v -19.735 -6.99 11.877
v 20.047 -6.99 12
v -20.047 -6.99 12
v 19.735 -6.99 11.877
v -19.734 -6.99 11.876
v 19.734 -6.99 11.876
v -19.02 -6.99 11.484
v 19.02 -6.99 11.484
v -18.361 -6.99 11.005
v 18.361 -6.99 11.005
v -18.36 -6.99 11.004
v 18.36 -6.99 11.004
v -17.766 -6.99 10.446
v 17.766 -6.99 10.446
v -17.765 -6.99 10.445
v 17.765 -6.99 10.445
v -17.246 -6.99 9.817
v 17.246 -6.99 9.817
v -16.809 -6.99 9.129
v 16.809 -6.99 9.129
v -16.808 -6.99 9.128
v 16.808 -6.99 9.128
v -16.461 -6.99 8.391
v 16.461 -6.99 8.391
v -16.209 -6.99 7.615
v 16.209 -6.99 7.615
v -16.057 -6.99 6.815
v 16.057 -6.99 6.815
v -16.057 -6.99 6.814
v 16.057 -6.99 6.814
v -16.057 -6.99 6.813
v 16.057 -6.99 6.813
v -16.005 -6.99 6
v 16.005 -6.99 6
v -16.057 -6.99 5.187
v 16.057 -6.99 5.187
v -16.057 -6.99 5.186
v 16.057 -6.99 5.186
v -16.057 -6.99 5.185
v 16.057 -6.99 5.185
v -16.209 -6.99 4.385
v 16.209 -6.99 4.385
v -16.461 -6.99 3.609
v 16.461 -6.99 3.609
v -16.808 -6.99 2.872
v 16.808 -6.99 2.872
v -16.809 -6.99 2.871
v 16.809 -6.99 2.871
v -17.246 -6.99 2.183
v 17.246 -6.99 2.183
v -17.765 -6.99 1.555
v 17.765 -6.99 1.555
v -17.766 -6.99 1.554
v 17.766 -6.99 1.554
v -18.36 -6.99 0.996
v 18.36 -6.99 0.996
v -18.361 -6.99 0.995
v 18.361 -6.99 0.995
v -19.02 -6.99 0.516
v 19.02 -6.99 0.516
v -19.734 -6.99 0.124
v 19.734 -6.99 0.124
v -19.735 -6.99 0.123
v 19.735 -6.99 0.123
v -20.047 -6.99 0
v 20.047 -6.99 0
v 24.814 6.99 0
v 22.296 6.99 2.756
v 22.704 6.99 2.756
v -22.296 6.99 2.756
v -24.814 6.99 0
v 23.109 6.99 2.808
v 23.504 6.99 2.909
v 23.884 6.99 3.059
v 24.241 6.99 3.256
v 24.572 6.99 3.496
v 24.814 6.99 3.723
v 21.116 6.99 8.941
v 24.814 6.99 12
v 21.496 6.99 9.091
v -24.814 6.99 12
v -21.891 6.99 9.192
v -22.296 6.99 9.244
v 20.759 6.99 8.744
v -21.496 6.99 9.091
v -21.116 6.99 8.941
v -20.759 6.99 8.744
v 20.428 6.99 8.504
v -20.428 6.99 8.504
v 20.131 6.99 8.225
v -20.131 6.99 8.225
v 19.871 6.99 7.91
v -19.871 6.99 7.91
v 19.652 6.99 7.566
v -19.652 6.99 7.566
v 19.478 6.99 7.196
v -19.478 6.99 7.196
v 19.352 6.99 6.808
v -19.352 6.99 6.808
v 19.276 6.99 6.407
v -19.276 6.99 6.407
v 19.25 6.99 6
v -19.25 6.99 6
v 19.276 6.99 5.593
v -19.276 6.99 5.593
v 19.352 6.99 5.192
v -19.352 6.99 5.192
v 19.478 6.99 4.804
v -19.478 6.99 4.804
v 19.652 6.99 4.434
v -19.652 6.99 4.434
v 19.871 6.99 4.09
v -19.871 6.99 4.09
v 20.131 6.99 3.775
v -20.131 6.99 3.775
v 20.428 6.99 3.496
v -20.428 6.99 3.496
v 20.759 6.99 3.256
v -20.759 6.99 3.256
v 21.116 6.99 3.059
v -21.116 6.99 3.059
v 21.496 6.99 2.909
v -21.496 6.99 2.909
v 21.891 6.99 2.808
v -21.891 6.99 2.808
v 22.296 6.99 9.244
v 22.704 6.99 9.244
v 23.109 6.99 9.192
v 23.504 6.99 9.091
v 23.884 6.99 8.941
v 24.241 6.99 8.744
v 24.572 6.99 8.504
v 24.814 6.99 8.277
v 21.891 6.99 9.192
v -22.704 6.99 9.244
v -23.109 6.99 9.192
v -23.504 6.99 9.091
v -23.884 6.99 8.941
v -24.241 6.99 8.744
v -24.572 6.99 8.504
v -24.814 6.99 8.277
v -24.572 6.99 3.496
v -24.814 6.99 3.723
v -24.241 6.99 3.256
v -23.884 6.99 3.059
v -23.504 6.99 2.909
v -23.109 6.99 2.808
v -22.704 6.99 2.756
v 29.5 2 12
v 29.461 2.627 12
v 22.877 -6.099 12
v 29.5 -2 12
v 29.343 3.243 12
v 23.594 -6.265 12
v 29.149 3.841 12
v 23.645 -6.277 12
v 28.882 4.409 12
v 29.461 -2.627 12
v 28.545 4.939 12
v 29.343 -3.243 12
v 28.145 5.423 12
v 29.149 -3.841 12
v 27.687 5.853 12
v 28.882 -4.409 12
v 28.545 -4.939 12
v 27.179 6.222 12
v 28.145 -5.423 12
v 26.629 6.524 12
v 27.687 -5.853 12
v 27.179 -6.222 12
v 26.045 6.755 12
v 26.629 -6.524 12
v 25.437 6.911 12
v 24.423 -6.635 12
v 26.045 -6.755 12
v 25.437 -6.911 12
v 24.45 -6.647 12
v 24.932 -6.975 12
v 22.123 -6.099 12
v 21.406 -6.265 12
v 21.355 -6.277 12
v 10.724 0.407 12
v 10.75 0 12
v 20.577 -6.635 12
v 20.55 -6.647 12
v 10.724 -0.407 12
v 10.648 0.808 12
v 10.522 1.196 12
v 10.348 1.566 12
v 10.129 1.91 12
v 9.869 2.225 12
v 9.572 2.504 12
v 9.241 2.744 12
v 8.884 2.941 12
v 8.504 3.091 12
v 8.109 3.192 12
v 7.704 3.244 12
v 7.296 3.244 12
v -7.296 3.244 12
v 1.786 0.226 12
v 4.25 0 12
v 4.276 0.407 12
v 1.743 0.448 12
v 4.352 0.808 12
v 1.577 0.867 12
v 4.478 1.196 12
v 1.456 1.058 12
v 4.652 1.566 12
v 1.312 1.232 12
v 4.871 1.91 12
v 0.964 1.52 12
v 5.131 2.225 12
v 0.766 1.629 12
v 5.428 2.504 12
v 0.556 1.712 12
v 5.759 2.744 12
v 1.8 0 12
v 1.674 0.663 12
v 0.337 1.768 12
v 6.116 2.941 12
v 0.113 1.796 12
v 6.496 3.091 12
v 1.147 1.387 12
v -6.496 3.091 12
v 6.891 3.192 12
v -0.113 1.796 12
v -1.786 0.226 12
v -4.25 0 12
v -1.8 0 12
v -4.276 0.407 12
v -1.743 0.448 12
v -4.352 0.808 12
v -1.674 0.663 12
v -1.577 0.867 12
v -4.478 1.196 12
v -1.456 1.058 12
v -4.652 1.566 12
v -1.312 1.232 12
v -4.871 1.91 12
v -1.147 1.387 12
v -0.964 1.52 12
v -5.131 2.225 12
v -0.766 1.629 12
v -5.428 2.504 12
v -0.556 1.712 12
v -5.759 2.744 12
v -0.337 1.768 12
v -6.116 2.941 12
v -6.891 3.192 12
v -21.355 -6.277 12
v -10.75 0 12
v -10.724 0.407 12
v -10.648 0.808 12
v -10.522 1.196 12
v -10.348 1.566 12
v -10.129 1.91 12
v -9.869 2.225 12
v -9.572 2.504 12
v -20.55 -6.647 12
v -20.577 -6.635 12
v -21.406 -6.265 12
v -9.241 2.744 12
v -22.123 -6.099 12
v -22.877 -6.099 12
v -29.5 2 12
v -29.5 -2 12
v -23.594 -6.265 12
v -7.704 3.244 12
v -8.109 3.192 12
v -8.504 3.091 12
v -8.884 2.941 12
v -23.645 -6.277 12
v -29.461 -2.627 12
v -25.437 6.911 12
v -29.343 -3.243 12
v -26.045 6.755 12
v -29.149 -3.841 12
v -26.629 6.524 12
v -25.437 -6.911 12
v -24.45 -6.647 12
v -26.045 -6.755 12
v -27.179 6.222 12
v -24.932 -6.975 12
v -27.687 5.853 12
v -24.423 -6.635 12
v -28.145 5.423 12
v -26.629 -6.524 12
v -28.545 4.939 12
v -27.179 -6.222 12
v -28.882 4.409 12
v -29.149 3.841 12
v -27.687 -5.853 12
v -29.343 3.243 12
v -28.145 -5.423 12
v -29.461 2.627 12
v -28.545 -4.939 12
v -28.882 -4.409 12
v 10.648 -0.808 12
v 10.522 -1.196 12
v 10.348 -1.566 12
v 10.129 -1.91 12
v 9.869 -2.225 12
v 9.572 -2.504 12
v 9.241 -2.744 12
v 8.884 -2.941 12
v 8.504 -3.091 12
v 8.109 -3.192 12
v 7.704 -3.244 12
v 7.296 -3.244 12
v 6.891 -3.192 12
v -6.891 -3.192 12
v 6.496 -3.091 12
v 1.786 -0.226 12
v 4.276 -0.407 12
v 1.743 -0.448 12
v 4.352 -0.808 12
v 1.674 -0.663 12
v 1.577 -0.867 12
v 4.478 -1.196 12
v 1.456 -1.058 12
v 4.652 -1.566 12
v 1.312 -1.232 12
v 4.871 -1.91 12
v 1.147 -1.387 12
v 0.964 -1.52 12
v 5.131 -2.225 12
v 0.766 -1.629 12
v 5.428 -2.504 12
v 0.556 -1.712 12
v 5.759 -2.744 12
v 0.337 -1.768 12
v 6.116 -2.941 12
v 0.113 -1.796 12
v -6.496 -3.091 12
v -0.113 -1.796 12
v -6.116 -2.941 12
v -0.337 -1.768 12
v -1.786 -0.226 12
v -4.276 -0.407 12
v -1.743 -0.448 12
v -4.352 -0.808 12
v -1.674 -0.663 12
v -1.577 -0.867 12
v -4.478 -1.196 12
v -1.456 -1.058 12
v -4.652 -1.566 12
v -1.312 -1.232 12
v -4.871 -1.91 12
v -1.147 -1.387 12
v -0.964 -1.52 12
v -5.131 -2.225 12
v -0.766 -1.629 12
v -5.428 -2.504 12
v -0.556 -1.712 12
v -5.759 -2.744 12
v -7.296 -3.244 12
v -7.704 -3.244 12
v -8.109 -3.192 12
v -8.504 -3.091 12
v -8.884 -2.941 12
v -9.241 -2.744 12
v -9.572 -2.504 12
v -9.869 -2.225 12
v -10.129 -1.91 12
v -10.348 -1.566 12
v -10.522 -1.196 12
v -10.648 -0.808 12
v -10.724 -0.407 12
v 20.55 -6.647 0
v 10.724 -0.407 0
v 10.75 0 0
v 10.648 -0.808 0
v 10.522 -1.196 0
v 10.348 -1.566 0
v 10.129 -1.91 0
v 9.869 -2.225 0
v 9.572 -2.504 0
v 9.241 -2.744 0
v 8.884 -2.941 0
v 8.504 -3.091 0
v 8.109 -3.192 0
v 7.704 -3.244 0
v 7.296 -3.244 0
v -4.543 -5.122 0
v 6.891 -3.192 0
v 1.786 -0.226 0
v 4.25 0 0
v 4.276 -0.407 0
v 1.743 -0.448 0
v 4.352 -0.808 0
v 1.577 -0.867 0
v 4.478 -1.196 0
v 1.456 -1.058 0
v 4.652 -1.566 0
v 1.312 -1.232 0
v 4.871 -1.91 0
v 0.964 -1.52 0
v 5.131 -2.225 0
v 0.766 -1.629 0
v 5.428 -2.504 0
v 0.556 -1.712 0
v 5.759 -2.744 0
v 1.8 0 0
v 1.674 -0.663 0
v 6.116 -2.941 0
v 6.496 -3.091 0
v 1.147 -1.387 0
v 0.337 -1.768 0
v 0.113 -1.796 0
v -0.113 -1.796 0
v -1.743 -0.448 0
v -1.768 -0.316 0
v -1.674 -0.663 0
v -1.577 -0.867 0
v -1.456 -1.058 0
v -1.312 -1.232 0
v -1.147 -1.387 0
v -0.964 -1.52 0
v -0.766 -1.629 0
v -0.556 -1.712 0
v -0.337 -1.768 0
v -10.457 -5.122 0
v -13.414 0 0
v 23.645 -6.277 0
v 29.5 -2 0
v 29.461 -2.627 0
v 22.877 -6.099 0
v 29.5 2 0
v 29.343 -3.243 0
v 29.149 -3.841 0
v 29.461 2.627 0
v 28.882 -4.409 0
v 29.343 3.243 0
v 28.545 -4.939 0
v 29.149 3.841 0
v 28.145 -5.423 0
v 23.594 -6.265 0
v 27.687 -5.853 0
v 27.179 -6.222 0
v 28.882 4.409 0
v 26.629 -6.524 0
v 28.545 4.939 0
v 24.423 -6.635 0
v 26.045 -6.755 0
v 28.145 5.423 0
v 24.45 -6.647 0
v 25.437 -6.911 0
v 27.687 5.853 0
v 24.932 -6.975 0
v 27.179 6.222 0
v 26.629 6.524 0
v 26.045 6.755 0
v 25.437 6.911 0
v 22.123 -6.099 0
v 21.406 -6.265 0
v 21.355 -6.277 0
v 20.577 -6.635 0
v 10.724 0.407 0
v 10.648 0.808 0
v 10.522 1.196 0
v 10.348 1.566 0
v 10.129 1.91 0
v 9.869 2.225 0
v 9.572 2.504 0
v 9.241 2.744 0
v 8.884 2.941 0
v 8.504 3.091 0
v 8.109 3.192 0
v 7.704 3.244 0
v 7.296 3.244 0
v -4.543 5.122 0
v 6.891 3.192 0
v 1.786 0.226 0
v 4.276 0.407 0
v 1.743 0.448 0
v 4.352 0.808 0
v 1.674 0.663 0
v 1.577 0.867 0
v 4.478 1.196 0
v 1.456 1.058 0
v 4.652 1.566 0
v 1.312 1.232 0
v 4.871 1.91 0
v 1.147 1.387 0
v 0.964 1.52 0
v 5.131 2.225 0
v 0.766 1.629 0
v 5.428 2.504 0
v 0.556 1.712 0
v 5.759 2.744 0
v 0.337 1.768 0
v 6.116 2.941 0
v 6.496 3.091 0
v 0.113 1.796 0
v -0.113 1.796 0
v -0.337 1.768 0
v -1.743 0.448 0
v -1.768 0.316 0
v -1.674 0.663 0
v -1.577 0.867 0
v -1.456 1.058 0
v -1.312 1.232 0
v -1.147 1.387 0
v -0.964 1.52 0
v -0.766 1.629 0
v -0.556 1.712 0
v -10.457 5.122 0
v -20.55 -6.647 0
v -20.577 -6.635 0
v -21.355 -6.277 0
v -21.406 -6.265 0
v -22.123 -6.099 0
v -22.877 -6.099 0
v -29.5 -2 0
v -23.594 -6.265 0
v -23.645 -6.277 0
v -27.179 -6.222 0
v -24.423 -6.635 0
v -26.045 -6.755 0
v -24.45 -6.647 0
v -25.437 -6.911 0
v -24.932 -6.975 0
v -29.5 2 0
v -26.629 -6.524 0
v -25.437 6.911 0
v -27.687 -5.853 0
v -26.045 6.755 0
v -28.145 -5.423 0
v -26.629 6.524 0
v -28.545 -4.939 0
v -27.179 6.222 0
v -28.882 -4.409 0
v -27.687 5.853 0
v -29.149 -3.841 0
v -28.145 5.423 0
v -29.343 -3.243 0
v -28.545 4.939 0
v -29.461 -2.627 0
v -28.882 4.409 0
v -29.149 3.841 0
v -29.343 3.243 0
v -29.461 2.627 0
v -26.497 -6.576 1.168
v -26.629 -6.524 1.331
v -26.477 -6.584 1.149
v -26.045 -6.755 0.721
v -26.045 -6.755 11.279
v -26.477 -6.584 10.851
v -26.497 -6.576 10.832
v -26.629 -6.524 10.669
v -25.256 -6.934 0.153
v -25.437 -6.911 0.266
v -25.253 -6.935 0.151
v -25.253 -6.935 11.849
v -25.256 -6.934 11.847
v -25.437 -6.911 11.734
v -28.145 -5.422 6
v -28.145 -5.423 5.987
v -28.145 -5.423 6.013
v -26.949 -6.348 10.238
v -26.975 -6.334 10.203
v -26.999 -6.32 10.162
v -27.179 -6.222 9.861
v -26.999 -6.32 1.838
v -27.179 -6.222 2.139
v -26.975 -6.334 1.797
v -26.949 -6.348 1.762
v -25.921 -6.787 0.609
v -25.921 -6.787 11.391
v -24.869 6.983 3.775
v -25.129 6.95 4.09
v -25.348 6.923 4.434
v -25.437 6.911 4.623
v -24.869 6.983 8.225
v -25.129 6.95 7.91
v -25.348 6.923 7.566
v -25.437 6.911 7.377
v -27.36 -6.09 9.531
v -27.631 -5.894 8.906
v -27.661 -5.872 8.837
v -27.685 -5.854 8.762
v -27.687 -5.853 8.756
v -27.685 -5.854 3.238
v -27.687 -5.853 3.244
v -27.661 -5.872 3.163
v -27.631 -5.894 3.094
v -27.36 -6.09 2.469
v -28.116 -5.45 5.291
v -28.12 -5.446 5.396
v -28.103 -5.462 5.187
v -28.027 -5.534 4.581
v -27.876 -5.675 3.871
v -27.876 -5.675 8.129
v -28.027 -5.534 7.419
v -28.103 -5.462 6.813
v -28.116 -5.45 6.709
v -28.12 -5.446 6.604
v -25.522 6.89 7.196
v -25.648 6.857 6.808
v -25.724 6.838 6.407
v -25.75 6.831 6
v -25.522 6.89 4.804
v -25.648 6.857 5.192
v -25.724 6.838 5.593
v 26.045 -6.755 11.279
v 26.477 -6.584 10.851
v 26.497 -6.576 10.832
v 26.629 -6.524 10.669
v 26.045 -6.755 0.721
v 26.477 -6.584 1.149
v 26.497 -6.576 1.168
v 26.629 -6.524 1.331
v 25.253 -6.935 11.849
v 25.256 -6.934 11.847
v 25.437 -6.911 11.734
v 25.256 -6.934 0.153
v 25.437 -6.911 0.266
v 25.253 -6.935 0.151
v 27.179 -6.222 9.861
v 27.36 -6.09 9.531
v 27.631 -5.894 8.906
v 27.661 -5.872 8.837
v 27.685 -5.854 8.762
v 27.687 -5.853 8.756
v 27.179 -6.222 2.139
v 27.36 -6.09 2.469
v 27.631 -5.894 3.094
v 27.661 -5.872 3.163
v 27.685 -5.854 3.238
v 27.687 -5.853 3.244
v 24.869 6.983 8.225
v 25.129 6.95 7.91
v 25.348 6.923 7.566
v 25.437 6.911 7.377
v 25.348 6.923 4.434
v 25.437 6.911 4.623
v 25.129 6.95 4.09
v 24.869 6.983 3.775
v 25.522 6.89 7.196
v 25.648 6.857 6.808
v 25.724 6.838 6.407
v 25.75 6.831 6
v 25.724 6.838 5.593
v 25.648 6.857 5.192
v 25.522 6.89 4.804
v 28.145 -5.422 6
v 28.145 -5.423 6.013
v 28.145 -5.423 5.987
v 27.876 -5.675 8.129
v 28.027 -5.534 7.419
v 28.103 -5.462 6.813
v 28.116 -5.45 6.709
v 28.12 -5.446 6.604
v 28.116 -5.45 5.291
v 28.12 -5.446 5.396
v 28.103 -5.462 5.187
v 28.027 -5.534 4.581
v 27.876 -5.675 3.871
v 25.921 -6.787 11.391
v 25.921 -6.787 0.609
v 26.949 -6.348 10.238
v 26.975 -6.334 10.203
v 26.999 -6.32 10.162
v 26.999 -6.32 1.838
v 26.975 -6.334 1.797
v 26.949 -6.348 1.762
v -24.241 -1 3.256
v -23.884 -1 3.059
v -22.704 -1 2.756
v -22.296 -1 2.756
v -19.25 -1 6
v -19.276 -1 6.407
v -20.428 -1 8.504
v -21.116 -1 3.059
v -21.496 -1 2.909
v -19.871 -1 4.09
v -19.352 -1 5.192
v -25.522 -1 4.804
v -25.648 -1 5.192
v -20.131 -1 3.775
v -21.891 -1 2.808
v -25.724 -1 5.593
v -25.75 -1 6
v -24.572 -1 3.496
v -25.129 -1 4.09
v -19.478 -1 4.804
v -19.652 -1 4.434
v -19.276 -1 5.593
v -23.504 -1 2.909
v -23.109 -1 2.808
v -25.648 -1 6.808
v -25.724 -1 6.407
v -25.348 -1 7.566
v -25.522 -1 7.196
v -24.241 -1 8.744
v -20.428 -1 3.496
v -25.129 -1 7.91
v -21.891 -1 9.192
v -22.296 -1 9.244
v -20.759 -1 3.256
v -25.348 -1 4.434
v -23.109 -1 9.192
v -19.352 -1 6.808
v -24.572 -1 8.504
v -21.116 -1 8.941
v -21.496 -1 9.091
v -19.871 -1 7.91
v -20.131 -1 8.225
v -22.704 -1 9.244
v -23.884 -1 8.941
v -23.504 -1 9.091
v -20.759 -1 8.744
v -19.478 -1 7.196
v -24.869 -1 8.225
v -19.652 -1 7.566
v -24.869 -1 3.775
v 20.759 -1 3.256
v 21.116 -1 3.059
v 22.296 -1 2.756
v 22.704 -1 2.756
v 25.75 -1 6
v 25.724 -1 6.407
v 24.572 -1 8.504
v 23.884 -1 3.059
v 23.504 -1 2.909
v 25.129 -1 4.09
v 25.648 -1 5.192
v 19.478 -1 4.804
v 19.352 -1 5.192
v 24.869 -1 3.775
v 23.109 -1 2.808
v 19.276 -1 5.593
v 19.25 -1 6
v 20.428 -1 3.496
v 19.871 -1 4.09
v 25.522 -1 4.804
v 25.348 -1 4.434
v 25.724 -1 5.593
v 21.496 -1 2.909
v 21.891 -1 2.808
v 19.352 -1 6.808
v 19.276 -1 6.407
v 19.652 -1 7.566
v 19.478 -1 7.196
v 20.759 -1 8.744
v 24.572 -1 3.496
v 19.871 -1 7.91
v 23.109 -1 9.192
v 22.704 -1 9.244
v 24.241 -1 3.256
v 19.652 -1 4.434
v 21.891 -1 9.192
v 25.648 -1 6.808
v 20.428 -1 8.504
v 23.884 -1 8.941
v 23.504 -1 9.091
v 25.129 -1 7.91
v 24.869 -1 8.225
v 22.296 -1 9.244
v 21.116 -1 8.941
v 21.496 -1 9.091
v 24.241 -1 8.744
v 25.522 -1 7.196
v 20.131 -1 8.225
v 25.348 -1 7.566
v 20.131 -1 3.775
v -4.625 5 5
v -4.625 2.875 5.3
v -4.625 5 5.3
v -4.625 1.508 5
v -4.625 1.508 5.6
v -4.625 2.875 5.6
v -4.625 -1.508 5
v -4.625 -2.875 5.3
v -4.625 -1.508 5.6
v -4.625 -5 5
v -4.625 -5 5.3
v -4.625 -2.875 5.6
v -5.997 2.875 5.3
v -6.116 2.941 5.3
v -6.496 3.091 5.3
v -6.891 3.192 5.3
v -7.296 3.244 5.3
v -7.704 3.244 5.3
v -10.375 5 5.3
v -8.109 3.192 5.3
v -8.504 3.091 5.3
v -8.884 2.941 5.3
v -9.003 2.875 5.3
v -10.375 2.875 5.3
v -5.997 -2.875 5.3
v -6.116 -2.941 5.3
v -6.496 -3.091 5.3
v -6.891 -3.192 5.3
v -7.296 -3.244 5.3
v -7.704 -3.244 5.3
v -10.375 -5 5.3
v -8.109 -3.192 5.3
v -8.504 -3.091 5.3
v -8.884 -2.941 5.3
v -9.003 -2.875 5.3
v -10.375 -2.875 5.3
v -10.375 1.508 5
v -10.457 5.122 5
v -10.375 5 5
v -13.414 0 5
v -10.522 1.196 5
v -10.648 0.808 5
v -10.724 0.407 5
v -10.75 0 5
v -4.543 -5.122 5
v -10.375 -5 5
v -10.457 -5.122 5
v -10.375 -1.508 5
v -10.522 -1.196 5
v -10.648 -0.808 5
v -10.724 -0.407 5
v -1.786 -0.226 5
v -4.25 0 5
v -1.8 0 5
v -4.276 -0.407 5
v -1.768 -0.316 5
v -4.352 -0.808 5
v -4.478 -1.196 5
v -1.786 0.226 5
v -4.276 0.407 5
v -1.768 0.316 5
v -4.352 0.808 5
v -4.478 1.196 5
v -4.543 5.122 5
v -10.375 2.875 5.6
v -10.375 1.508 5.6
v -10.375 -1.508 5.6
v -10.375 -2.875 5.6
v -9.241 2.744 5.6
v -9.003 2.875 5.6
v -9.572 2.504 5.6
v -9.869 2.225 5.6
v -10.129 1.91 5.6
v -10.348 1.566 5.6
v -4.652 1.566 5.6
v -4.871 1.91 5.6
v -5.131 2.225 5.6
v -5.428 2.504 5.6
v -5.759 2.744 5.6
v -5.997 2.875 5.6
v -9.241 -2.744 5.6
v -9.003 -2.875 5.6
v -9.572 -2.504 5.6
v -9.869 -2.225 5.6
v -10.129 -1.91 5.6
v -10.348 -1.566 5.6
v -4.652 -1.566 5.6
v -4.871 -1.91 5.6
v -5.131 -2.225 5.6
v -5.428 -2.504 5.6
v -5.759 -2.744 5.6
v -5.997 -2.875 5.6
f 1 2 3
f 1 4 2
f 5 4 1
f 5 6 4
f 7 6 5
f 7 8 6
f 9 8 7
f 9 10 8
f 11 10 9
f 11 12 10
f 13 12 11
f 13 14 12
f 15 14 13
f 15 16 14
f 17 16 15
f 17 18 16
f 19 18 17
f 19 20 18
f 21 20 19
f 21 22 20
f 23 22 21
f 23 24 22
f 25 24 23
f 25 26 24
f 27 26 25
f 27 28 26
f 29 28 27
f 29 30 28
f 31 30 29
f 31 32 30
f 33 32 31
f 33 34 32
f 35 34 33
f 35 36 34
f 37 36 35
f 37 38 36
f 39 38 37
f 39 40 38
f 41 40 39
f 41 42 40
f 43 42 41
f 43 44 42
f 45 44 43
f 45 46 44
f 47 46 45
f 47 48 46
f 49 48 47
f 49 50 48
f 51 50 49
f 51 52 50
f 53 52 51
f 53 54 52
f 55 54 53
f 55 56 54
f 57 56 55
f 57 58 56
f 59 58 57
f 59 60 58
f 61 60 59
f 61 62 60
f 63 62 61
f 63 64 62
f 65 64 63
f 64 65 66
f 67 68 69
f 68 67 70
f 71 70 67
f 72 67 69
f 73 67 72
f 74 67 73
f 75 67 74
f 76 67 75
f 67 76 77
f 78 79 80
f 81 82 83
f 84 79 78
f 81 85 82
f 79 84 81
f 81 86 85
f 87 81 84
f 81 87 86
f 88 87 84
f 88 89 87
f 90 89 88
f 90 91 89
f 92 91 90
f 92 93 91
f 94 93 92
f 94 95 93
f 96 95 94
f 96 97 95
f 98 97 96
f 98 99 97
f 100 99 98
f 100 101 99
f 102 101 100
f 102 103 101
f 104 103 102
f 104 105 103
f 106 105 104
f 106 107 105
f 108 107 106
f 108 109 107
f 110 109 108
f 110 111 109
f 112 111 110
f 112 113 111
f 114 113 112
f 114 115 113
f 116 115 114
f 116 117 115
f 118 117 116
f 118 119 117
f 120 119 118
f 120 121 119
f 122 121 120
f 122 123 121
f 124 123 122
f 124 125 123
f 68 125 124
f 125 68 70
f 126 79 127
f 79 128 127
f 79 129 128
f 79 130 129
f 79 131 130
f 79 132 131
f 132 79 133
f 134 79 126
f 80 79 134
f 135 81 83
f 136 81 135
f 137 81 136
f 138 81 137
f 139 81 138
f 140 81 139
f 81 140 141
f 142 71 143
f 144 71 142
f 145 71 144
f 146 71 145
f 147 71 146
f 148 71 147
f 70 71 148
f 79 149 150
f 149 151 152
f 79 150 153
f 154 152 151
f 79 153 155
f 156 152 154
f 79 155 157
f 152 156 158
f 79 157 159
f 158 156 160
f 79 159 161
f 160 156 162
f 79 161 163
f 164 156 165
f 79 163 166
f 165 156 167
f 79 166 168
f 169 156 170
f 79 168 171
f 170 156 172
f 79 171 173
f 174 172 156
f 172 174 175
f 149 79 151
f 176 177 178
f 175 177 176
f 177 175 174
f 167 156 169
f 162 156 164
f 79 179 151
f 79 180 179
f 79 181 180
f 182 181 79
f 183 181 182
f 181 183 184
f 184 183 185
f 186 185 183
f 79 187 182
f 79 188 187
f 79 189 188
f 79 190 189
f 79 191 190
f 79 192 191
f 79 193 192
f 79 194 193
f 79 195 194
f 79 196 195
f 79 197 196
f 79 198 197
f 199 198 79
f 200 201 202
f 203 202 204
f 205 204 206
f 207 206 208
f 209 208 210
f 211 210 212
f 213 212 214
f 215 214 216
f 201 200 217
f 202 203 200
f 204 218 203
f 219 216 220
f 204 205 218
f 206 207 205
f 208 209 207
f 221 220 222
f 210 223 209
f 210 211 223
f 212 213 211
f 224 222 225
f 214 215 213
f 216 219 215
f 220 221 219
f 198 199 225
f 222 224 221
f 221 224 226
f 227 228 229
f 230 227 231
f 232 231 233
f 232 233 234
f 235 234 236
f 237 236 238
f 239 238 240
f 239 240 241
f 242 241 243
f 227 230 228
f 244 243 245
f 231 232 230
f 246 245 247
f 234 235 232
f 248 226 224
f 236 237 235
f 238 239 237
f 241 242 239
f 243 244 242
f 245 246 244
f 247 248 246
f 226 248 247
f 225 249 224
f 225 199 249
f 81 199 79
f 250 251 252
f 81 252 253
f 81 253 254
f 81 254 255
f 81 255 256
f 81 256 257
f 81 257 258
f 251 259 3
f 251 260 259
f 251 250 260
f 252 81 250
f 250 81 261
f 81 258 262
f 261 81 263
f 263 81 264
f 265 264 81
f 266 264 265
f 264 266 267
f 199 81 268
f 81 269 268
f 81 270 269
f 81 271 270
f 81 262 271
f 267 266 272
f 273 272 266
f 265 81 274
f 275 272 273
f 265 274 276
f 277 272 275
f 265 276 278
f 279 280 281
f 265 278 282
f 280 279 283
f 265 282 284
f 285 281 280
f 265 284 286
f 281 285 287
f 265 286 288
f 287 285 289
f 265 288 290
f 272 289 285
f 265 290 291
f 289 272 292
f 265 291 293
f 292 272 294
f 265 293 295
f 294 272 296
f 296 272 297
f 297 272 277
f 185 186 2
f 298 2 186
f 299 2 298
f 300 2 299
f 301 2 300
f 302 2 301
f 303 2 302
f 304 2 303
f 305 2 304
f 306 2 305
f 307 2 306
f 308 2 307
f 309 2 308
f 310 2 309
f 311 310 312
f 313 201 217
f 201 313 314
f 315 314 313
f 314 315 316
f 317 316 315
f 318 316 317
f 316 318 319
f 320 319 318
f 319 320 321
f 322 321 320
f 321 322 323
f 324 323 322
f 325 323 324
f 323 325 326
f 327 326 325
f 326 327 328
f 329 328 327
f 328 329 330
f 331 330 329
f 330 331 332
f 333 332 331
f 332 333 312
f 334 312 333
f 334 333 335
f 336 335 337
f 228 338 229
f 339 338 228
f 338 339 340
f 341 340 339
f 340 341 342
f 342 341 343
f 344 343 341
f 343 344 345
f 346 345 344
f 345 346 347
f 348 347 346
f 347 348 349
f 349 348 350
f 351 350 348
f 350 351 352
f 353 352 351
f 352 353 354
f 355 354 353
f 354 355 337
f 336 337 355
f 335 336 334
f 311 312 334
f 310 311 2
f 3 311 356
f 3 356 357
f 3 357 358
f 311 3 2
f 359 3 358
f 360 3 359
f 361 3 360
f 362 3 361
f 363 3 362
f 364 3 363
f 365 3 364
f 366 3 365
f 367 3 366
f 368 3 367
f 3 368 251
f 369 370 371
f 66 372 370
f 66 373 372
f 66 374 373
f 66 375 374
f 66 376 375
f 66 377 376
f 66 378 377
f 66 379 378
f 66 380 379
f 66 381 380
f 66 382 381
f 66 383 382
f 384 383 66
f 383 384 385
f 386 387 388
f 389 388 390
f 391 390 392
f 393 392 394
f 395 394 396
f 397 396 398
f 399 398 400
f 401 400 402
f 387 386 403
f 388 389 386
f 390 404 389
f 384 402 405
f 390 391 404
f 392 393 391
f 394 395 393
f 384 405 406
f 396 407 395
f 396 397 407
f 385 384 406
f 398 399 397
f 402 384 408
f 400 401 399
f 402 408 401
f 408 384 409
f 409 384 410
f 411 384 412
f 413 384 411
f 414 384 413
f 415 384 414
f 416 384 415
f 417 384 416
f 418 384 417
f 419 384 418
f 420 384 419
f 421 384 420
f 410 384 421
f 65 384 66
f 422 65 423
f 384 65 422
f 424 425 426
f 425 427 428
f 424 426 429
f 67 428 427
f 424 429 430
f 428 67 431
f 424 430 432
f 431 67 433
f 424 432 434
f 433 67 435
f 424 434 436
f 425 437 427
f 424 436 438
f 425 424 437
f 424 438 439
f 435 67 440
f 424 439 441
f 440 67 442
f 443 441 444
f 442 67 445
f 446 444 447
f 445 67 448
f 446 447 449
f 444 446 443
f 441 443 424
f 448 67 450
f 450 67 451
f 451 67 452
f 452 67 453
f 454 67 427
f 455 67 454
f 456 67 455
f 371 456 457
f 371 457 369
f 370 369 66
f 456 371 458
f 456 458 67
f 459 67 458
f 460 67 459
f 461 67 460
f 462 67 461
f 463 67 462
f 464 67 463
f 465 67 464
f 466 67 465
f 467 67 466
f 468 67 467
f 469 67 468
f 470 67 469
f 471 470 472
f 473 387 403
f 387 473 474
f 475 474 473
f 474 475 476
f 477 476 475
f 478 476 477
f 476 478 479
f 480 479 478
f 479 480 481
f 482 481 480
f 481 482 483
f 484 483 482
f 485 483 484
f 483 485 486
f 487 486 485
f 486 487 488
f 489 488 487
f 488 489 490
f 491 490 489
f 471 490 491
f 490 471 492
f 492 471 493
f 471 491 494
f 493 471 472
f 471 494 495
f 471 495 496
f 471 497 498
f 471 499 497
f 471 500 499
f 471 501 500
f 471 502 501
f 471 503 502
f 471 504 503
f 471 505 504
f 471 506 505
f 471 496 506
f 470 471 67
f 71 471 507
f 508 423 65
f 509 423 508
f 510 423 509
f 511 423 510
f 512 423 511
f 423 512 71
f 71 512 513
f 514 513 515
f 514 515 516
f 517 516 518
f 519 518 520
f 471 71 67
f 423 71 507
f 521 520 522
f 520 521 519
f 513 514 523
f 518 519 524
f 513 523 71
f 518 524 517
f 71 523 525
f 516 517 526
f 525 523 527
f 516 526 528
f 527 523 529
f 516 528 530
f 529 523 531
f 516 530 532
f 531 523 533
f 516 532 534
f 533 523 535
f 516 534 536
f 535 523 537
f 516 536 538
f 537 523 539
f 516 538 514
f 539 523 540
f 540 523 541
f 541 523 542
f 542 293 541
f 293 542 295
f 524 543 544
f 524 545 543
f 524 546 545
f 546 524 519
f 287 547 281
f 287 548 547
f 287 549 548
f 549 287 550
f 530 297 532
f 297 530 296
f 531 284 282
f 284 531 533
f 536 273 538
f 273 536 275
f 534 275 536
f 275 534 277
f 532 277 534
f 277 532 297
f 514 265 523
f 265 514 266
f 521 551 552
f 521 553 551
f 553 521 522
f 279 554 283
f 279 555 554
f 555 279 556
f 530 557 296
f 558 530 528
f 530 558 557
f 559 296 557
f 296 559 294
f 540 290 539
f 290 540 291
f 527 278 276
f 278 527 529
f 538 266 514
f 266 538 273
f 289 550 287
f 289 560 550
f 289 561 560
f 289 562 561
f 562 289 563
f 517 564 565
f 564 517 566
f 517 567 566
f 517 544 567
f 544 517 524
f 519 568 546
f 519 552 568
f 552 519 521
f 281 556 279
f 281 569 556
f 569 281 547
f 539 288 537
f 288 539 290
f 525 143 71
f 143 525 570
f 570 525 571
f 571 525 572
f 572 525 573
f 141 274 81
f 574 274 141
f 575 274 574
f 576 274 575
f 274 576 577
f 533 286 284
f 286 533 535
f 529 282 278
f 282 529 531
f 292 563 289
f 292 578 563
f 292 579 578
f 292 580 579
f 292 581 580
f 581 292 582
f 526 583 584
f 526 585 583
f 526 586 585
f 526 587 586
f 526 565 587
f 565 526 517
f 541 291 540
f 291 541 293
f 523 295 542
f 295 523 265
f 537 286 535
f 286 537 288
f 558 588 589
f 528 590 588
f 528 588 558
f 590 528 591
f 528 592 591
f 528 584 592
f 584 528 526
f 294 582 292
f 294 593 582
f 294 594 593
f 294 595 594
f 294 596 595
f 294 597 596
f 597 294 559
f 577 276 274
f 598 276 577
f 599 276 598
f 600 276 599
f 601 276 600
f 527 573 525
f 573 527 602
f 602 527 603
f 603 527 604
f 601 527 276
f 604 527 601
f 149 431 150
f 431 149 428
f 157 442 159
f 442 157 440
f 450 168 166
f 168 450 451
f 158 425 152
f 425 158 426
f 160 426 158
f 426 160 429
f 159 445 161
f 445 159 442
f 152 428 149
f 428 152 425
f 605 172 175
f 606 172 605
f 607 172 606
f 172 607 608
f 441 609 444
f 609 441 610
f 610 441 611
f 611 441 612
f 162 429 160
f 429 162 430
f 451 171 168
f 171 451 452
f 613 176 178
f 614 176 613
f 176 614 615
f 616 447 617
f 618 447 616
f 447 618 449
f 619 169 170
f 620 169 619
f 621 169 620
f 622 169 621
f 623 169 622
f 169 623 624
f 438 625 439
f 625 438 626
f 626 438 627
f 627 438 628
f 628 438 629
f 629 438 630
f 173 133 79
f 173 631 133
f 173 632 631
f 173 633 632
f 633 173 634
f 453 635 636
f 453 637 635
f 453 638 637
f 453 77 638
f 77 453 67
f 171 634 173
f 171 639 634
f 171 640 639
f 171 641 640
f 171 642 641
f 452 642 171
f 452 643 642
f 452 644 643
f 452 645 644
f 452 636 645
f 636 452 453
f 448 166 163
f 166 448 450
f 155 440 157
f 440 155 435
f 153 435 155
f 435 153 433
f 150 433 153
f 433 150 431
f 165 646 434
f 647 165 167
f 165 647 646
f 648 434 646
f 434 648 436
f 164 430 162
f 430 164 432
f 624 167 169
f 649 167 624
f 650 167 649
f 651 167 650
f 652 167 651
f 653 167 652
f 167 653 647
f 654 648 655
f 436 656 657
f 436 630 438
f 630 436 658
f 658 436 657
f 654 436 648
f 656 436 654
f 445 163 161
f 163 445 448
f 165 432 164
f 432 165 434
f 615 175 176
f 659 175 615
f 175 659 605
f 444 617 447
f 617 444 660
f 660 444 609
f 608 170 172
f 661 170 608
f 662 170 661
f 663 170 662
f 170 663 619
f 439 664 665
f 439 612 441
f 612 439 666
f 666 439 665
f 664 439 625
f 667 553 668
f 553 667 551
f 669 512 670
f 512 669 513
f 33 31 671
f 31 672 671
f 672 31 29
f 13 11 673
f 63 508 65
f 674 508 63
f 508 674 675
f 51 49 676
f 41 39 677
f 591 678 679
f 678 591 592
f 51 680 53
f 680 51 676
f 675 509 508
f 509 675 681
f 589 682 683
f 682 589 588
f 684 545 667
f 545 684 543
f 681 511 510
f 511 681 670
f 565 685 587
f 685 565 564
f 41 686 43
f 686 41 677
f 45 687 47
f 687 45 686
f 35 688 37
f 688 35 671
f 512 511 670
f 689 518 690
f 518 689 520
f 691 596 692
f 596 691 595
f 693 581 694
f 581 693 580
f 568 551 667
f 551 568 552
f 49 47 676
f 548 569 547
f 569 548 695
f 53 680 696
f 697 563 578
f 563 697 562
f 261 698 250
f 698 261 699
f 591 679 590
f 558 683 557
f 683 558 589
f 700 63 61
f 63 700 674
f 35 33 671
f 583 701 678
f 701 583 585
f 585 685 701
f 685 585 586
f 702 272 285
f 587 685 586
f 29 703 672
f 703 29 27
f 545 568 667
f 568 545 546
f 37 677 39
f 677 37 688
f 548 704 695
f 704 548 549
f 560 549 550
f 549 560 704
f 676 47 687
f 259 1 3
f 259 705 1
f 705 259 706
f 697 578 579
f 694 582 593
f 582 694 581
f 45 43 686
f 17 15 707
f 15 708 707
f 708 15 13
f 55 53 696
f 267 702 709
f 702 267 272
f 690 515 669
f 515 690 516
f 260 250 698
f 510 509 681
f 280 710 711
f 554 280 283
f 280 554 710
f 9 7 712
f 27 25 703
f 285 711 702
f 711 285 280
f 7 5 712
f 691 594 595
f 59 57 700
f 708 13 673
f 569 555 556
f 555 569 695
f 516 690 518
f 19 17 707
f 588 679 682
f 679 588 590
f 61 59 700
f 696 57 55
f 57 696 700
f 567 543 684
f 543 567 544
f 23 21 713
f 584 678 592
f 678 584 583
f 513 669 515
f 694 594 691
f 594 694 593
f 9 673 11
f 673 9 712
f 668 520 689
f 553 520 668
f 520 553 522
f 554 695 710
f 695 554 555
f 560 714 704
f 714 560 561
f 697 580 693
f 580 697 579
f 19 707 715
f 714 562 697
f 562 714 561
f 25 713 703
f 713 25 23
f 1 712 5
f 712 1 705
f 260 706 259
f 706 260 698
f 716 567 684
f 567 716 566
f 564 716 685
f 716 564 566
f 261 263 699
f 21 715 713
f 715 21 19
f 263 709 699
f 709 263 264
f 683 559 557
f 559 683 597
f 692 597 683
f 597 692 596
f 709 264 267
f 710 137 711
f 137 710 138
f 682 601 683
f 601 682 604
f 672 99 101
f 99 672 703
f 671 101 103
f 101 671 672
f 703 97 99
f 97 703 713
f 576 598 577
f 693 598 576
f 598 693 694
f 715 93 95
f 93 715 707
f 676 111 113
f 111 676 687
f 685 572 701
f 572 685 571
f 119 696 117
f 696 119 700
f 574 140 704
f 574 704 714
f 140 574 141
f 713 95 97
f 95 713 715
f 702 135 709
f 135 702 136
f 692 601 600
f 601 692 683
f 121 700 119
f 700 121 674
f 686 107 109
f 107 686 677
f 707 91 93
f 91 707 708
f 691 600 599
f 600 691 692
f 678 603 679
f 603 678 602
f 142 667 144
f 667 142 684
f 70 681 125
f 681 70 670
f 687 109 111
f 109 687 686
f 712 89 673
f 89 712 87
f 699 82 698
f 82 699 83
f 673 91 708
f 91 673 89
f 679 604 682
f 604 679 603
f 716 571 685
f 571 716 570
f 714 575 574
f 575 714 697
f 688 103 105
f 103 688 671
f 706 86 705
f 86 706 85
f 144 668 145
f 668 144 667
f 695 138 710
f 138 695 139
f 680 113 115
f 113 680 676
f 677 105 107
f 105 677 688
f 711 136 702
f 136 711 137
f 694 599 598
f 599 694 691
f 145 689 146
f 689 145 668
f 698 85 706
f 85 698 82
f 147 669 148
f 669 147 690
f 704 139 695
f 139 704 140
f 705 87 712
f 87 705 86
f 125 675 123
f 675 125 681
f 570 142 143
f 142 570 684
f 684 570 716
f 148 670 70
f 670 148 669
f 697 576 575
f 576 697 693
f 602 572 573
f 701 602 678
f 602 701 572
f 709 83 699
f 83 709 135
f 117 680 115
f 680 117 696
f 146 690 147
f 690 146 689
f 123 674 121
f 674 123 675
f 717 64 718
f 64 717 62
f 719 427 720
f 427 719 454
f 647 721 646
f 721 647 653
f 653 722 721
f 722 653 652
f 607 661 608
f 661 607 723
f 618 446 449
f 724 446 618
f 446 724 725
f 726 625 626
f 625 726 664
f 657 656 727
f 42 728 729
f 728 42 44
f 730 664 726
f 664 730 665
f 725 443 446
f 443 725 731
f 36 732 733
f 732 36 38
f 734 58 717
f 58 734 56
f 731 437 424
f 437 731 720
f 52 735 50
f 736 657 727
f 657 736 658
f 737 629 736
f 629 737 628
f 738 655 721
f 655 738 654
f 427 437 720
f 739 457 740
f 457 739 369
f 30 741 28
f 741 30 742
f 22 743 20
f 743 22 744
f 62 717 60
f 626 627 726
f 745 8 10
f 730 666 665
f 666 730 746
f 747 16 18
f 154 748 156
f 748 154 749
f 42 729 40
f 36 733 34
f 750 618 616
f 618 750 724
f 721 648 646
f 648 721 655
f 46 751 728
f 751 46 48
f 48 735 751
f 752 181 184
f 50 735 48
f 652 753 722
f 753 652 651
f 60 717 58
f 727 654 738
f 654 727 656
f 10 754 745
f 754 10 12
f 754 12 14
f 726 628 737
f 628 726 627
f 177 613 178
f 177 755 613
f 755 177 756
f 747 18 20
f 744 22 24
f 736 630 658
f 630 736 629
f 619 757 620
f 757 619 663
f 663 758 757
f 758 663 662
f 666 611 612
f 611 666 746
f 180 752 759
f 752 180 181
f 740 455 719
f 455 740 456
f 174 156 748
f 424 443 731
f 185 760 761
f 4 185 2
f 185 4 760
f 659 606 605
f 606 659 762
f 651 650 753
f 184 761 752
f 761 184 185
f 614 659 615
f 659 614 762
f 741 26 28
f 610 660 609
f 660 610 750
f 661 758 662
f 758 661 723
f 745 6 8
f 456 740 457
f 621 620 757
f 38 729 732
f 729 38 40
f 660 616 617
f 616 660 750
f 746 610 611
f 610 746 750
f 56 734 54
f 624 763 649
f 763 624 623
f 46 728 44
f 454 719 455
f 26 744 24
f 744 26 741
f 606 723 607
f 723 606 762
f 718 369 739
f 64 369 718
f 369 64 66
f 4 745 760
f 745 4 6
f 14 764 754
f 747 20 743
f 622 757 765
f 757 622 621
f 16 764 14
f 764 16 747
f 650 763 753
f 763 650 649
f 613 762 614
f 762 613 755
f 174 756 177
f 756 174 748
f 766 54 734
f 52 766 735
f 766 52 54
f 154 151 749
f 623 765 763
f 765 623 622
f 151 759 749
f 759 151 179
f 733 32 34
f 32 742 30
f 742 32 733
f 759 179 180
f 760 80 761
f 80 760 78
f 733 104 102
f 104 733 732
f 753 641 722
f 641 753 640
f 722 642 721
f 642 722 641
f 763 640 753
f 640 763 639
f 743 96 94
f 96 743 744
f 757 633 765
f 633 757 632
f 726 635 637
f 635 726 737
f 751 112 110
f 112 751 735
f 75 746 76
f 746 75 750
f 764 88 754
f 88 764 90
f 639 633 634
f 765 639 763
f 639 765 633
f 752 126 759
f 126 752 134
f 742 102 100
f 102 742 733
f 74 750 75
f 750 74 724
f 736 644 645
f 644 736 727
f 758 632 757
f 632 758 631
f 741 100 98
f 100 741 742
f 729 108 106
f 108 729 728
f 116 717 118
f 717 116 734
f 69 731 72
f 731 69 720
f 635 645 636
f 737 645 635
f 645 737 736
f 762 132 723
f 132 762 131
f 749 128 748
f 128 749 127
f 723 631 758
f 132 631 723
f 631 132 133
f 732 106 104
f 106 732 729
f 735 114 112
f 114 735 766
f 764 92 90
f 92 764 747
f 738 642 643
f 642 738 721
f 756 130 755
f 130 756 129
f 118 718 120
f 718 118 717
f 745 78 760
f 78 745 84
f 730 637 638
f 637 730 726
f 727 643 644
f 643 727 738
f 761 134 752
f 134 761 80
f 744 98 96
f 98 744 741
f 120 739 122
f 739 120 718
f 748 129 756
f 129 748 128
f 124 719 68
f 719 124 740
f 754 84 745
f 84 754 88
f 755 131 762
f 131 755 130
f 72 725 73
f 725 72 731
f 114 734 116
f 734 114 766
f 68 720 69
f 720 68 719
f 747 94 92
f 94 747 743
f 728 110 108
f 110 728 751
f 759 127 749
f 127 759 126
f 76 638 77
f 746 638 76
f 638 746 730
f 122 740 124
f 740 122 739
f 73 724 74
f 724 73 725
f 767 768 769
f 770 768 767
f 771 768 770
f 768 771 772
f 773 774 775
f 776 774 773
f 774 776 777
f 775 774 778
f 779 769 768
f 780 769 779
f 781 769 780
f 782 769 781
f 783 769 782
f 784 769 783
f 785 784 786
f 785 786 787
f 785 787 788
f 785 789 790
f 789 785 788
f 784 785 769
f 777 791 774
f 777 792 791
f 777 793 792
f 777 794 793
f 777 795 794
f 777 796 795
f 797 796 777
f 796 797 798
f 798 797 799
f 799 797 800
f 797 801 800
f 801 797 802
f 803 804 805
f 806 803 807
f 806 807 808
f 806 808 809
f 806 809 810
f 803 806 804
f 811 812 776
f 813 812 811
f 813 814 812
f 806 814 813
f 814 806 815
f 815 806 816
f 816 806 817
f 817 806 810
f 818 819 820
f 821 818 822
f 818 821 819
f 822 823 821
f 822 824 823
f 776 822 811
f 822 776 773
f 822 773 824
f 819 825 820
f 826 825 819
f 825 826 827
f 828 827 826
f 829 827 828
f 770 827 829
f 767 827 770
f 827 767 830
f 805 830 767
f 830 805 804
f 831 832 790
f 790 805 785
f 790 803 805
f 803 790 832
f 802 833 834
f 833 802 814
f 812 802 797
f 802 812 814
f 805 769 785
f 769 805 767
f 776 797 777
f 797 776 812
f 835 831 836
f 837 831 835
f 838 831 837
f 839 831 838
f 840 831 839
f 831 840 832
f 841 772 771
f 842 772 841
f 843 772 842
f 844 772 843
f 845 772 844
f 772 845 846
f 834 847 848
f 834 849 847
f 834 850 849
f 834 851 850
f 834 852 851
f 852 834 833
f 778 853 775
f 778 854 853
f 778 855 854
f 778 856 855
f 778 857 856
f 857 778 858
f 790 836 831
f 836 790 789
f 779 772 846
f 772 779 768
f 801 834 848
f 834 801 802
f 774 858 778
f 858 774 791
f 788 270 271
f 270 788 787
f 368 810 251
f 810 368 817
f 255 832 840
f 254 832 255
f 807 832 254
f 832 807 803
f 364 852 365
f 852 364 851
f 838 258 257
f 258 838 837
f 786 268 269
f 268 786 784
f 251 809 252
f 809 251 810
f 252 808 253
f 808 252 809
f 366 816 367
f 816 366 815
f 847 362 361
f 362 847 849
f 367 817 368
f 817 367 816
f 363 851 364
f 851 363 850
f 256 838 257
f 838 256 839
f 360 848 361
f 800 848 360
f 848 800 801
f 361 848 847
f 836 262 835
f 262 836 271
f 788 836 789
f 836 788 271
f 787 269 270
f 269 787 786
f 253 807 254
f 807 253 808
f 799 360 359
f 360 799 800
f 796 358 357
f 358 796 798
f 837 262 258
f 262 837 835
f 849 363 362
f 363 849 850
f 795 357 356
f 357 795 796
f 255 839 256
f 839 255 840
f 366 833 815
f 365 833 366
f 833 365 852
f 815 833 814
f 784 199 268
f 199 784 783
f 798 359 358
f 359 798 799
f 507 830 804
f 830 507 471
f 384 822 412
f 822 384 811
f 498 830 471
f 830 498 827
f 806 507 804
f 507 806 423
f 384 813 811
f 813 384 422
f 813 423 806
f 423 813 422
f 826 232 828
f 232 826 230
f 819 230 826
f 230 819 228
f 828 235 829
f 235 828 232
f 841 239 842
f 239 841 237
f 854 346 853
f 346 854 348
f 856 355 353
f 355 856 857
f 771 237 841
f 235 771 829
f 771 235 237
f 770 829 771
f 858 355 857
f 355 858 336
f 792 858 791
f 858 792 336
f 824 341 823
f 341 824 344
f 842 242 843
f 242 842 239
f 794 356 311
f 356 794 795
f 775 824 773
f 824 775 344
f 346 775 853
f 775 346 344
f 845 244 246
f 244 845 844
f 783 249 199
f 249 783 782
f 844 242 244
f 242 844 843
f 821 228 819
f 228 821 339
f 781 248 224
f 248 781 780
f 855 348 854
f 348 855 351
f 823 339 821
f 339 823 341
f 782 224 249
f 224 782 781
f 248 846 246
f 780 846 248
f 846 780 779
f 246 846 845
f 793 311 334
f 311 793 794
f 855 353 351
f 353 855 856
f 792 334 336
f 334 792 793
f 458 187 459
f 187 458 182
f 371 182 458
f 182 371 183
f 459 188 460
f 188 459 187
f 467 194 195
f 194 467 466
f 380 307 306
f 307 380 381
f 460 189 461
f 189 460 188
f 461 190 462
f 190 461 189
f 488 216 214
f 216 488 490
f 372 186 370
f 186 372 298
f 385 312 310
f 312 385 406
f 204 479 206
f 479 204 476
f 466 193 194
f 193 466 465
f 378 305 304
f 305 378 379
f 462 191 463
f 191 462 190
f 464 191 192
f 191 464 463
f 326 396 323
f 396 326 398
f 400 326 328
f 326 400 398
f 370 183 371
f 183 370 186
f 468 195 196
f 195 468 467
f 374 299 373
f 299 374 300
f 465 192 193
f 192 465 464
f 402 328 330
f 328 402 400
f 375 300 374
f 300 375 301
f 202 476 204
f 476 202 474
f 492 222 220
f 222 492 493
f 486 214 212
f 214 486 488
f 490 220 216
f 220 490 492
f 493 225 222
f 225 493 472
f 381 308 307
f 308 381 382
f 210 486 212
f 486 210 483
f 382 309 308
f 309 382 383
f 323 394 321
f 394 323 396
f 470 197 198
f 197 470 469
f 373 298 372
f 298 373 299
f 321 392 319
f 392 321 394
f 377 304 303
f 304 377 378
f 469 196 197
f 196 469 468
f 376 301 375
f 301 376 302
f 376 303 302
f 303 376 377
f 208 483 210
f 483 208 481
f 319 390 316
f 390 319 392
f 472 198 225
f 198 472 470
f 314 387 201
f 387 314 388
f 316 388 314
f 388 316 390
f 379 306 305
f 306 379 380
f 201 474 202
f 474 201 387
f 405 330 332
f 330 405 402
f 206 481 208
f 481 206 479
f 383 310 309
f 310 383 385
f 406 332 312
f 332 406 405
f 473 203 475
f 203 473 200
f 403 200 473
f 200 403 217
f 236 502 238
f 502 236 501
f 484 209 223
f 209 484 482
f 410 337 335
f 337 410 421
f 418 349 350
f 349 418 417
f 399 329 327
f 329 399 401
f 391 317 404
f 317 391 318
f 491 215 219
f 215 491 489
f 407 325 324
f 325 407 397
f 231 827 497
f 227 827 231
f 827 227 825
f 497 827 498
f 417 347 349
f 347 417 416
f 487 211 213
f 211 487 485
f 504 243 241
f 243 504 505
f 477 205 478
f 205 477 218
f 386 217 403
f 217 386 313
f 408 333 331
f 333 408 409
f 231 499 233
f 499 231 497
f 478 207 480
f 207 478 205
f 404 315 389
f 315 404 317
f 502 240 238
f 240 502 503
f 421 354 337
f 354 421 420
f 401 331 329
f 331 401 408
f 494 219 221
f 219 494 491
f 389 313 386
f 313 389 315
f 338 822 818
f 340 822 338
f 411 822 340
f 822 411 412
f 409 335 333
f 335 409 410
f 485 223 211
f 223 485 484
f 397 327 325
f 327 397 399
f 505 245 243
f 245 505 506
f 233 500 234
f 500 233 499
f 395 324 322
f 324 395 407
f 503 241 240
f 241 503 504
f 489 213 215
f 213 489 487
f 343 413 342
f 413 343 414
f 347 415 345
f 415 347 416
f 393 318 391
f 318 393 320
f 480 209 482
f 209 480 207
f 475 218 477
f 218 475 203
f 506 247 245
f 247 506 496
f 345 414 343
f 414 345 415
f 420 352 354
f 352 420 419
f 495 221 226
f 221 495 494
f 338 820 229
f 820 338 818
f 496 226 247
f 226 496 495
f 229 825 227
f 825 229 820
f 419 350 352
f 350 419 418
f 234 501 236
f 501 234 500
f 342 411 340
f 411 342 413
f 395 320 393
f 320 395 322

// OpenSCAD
$fn = 50;


difference() {
	union() {
		hull() {
			translate(v = [-9.5000000000, 2.0000000000, 0]) {
				cylinder(h = 12, r = 5);
			}
			translate(v = [9.5000000000, 2.0000000000, 0]) {
				cylinder(h = 12, r = 5);
			}
			translate(v = [-9.5000000000, -2.0000000000, 0]) {
				cylinder(h = 12, r = 5);
			}
			translate(v = [9.5000000000, -2.0000000000, 0]) {
				cylinder(h = 12, r = 5);
			}
		}
		translate(v = [-15.0000000000, 0.0000000000, 0]) {
			hull() {
				translate(v = [-9.5000000000, 2.0000000000, 0]) {
					cylinder(h = 12, r = 5);
				}
				translate(v = [9.5000000000, 2.0000000000, 0]) {
					cylinder(h = 12, r = 5);
				}
				translate(v = [-9.5000000000, -2.0000000000, 0]) {
					cylinder(h = 12, r = 5);
				}
				translate(v = [9.5000000000, -2.0000000000, 0]) {
					cylinder(h = 12, r = 5);
				}
			}
		}
		translate(v = [-15.0000000000, 0.0000000000, 0]) {
			hull() {
				translate(v = [-9.5000000000, 2.0000000000, 0]) {
					cylinder(h = 12, r = 5);
				}
				translate(v = [9.5000000000, 2.0000000000, 0]) {
					cylinder(h = 12, r = 5);
				}
				translate(v = [-9.5000000000, -2.0000000000, 0]) {
					cylinder(h = 12, r = 5);
				}
				translate(v = [9.5000000000, -2.0000000000, 0]) {
					cylinder(h = 12, r = 5);
				}
			}
		}
		translate(v = [15.0000000000, 0.0000000000, 0]) {
			hull() {
				translate(v = [-9.5000000000, 2.0000000000, 0]) {
					cylinder(h = 12, r = 5);
				}
				translate(v = [9.5000000000, 2.0000000000, 0]) {
					cylinder(h = 12, r = 5);
				}
				translate(v = [-9.5000000000, -2.0000000000, 0]) {
					cylinder(h = 12, r = 5);
				}
				translate(v = [9.5000000000, -2.0000000000, 0]) {
					cylinder(h = 12, r = 5);
				}
			}
		}
		translate(v = [15.0000000000, 0.0000000000, 0]) {
			hull() {
				translate(v = [-9.5000000000, 2.0000000000, 0]) {
					cylinder(h = 12, r = 5);
				}
				translate(v = [9.5000000000, 2.0000000000, 0]) {
					cylinder(h = 12, r = 5);
				}
				translate(v = [-9.5000000000, -2.0000000000, 0]) {
					cylinder(h = 12, r = 5);
				}
				translate(v = [9.5000000000, -2.0000000000, 0]) {
					cylinder(h = 12, r = 5);
				}
			}
		}
	}
	union() {
		translate(v = [-22.5000000000, -7.0000000000, 6.0000000000]) {
			rotate(a = [90, 0, 0]) {
				difference() {
					union() {
						#translate(v = [0, 0, -14.0000000000]) {
							cylinder(h = 14, r = 2.2500000000);
						}
						#translate(v = [0, 0, -6]) {
							cylinder(h = 6, r1 = 3.2500000000, r2 = 6.5000000000);
						}
						#translate(v = [0, 0, -14.0000000000]) {
							cylinder(h = 14, r = 3.2500000000);
						}
						#translate(v = [0, 0, -14.0000000000]) {
							cylinder(h = 14, r = 2.2500000000);
						}
					}
					union();
				}
			}
		}
		translate(v = [22.5000000000, -7.0000000000, 6.0000000000]) {
			rotate(a = [90, 0, 0]) {
				difference() {
					union() {
						#translate(v = [0, 0, -14.0000000000]) {
							cylinder(h = 14, r = 2.2500000000);
						}
						#translate(v = [0, 0, -6]) {
							cylinder(h = 6, r1 = 3.2500000000, r2 = 6.5000000000);
						}
						#translate(v = [0, 0, -14.0000000000]) {
							cylinder(h = 14, r = 3.2500000000);
						}
						#translate(v = [0, 0, -14.0000000000]) {
							cylinder(h = 14, r = 2.2500000000);
						}
					}
					union();
				}
			}
		}
		translate(v = [-7.5000000000, 0.0000000000, 0]) {
			rotate(a = [0, 0, 0]) {
				difference() {
					union() {
						#translate(v = [-2.8750000000, -5.0000000000, -0.3000000000]) {
							cube(size = [5.7500000000, 10, 0.3000000000]);
						}
						#translate(v = [-2.8750000000, -2.8750000000, -0.6000000000]) {
							cube(size = [5.7500000000, 5.7500000000, 0.3000000000]);
						}
						#translate(v = [-2.8750000000, -5.0000000000, 5]) {
							cube(size = [5.7500000000, 10, 0.3000000000]);
						}
						#translate(v = [-2.8750000000, -2.8750000000, 5.3000000000]) {
							cube(size = [5.7500000000, 5.7500000000, 0.3000000000]);
						}
						#translate(v = [0, 0, -100.0000000000]) {
							cylinder(h = 200, r = 3.2500000000);
						}
						#linear_extrude(height = 5) {
							polygon(points = [[5.9142500000, 0.0000000000], [2.9571250000, 5.1218907443], [-2.9571250000, 5.1218907443], [-5.9142500000, 0.0000000000], [-2.9571250000, -5.1218907443], [2.9571250000, -5.1218907443]]);
						}
						#translate(v = [-2.8750000000, -5.0000000000, -0.3000000000]) {
							cube(size = [5.7500000000, 10, 0.3000000000]);
						}
						#translate(v = [-2.8750000000, -2.8750000000, -0.6000000000]) {
							cube(size = [5.7500000000, 5.7500000000, 0.3000000000]);
						}
						#translate(v = [-2.8750000000, -5.0000000000, 5]) {
							cube(size = [5.7500000000, 10, 0.3000000000]);
						}
						#translate(v = [-2.8750000000, -2.8750000000, 5.3000000000]) {
							cube(size = [5.7500000000, 5.7500000000, 0.3000000000]);
						}
						#translate(v = [0, 0, -100.0000000000]) {
							cylinder(h = 200, r = 3.2500000000);
						}
						#translate(v = [-2.8750000000, -5.0000000000, -0.3000000000]) {
							cube(size = [5.7500000000, 10, 0.3000000000]);
						}
						#translate(v = [-2.8750000000, -2.8750000000, -0.6000000000]) {
							cube(size = [5.7500000000, 5.7500000000, 0.3000000000]);
						}
						#translate(v = [-2.8750000000, -5.0000000000, 5]) {
							cube(size = [5.7500000000, 10, 0.3000000000]);
						}
						#translate(v = [-2.8750000000, -2.8750000000, 5.3000000000]) {
							cube(size = [5.7500000000, 5.7500000000, 0.3000000000]);
						}
						#translate(v = [0, 0, -100.0000000000]) {
							cylinder(h = 200, r = 3.2500000000);
						}
					}
					union();
				}
			}
		}
		translate(v = [-7.5000000000, 0.0000000000, 0]) {
			translate(v = [0, 0, -100]) {
				cylinder(h = 200, r = 3.2500000000);
			}
		}
		translate(v = [7.5000000000, 0.0000000000, 0]) {
			translate(v = [0, 0, -100]) {
				cylinder(h = 200, r = 3.2500000000);
			}
		}
		translate(v = [-7.5000000000, 0.0000000000, 0]) {
			translate(v = [0, 0, -100]) {
				cylinder(h = 200, r = 1.8000000000);
			}
		}
		translate(v = [0, 0, -100]) {
			cylinder(h = 200, r = 1.8000000000);
		}
		translate(v = [7.5000000000, 0.0000000000, 0]) {
			translate(v = [0, 0, -100]) {
				cylinder(h = 200, r = 1.8000000000);
			}
		}
	}
}
